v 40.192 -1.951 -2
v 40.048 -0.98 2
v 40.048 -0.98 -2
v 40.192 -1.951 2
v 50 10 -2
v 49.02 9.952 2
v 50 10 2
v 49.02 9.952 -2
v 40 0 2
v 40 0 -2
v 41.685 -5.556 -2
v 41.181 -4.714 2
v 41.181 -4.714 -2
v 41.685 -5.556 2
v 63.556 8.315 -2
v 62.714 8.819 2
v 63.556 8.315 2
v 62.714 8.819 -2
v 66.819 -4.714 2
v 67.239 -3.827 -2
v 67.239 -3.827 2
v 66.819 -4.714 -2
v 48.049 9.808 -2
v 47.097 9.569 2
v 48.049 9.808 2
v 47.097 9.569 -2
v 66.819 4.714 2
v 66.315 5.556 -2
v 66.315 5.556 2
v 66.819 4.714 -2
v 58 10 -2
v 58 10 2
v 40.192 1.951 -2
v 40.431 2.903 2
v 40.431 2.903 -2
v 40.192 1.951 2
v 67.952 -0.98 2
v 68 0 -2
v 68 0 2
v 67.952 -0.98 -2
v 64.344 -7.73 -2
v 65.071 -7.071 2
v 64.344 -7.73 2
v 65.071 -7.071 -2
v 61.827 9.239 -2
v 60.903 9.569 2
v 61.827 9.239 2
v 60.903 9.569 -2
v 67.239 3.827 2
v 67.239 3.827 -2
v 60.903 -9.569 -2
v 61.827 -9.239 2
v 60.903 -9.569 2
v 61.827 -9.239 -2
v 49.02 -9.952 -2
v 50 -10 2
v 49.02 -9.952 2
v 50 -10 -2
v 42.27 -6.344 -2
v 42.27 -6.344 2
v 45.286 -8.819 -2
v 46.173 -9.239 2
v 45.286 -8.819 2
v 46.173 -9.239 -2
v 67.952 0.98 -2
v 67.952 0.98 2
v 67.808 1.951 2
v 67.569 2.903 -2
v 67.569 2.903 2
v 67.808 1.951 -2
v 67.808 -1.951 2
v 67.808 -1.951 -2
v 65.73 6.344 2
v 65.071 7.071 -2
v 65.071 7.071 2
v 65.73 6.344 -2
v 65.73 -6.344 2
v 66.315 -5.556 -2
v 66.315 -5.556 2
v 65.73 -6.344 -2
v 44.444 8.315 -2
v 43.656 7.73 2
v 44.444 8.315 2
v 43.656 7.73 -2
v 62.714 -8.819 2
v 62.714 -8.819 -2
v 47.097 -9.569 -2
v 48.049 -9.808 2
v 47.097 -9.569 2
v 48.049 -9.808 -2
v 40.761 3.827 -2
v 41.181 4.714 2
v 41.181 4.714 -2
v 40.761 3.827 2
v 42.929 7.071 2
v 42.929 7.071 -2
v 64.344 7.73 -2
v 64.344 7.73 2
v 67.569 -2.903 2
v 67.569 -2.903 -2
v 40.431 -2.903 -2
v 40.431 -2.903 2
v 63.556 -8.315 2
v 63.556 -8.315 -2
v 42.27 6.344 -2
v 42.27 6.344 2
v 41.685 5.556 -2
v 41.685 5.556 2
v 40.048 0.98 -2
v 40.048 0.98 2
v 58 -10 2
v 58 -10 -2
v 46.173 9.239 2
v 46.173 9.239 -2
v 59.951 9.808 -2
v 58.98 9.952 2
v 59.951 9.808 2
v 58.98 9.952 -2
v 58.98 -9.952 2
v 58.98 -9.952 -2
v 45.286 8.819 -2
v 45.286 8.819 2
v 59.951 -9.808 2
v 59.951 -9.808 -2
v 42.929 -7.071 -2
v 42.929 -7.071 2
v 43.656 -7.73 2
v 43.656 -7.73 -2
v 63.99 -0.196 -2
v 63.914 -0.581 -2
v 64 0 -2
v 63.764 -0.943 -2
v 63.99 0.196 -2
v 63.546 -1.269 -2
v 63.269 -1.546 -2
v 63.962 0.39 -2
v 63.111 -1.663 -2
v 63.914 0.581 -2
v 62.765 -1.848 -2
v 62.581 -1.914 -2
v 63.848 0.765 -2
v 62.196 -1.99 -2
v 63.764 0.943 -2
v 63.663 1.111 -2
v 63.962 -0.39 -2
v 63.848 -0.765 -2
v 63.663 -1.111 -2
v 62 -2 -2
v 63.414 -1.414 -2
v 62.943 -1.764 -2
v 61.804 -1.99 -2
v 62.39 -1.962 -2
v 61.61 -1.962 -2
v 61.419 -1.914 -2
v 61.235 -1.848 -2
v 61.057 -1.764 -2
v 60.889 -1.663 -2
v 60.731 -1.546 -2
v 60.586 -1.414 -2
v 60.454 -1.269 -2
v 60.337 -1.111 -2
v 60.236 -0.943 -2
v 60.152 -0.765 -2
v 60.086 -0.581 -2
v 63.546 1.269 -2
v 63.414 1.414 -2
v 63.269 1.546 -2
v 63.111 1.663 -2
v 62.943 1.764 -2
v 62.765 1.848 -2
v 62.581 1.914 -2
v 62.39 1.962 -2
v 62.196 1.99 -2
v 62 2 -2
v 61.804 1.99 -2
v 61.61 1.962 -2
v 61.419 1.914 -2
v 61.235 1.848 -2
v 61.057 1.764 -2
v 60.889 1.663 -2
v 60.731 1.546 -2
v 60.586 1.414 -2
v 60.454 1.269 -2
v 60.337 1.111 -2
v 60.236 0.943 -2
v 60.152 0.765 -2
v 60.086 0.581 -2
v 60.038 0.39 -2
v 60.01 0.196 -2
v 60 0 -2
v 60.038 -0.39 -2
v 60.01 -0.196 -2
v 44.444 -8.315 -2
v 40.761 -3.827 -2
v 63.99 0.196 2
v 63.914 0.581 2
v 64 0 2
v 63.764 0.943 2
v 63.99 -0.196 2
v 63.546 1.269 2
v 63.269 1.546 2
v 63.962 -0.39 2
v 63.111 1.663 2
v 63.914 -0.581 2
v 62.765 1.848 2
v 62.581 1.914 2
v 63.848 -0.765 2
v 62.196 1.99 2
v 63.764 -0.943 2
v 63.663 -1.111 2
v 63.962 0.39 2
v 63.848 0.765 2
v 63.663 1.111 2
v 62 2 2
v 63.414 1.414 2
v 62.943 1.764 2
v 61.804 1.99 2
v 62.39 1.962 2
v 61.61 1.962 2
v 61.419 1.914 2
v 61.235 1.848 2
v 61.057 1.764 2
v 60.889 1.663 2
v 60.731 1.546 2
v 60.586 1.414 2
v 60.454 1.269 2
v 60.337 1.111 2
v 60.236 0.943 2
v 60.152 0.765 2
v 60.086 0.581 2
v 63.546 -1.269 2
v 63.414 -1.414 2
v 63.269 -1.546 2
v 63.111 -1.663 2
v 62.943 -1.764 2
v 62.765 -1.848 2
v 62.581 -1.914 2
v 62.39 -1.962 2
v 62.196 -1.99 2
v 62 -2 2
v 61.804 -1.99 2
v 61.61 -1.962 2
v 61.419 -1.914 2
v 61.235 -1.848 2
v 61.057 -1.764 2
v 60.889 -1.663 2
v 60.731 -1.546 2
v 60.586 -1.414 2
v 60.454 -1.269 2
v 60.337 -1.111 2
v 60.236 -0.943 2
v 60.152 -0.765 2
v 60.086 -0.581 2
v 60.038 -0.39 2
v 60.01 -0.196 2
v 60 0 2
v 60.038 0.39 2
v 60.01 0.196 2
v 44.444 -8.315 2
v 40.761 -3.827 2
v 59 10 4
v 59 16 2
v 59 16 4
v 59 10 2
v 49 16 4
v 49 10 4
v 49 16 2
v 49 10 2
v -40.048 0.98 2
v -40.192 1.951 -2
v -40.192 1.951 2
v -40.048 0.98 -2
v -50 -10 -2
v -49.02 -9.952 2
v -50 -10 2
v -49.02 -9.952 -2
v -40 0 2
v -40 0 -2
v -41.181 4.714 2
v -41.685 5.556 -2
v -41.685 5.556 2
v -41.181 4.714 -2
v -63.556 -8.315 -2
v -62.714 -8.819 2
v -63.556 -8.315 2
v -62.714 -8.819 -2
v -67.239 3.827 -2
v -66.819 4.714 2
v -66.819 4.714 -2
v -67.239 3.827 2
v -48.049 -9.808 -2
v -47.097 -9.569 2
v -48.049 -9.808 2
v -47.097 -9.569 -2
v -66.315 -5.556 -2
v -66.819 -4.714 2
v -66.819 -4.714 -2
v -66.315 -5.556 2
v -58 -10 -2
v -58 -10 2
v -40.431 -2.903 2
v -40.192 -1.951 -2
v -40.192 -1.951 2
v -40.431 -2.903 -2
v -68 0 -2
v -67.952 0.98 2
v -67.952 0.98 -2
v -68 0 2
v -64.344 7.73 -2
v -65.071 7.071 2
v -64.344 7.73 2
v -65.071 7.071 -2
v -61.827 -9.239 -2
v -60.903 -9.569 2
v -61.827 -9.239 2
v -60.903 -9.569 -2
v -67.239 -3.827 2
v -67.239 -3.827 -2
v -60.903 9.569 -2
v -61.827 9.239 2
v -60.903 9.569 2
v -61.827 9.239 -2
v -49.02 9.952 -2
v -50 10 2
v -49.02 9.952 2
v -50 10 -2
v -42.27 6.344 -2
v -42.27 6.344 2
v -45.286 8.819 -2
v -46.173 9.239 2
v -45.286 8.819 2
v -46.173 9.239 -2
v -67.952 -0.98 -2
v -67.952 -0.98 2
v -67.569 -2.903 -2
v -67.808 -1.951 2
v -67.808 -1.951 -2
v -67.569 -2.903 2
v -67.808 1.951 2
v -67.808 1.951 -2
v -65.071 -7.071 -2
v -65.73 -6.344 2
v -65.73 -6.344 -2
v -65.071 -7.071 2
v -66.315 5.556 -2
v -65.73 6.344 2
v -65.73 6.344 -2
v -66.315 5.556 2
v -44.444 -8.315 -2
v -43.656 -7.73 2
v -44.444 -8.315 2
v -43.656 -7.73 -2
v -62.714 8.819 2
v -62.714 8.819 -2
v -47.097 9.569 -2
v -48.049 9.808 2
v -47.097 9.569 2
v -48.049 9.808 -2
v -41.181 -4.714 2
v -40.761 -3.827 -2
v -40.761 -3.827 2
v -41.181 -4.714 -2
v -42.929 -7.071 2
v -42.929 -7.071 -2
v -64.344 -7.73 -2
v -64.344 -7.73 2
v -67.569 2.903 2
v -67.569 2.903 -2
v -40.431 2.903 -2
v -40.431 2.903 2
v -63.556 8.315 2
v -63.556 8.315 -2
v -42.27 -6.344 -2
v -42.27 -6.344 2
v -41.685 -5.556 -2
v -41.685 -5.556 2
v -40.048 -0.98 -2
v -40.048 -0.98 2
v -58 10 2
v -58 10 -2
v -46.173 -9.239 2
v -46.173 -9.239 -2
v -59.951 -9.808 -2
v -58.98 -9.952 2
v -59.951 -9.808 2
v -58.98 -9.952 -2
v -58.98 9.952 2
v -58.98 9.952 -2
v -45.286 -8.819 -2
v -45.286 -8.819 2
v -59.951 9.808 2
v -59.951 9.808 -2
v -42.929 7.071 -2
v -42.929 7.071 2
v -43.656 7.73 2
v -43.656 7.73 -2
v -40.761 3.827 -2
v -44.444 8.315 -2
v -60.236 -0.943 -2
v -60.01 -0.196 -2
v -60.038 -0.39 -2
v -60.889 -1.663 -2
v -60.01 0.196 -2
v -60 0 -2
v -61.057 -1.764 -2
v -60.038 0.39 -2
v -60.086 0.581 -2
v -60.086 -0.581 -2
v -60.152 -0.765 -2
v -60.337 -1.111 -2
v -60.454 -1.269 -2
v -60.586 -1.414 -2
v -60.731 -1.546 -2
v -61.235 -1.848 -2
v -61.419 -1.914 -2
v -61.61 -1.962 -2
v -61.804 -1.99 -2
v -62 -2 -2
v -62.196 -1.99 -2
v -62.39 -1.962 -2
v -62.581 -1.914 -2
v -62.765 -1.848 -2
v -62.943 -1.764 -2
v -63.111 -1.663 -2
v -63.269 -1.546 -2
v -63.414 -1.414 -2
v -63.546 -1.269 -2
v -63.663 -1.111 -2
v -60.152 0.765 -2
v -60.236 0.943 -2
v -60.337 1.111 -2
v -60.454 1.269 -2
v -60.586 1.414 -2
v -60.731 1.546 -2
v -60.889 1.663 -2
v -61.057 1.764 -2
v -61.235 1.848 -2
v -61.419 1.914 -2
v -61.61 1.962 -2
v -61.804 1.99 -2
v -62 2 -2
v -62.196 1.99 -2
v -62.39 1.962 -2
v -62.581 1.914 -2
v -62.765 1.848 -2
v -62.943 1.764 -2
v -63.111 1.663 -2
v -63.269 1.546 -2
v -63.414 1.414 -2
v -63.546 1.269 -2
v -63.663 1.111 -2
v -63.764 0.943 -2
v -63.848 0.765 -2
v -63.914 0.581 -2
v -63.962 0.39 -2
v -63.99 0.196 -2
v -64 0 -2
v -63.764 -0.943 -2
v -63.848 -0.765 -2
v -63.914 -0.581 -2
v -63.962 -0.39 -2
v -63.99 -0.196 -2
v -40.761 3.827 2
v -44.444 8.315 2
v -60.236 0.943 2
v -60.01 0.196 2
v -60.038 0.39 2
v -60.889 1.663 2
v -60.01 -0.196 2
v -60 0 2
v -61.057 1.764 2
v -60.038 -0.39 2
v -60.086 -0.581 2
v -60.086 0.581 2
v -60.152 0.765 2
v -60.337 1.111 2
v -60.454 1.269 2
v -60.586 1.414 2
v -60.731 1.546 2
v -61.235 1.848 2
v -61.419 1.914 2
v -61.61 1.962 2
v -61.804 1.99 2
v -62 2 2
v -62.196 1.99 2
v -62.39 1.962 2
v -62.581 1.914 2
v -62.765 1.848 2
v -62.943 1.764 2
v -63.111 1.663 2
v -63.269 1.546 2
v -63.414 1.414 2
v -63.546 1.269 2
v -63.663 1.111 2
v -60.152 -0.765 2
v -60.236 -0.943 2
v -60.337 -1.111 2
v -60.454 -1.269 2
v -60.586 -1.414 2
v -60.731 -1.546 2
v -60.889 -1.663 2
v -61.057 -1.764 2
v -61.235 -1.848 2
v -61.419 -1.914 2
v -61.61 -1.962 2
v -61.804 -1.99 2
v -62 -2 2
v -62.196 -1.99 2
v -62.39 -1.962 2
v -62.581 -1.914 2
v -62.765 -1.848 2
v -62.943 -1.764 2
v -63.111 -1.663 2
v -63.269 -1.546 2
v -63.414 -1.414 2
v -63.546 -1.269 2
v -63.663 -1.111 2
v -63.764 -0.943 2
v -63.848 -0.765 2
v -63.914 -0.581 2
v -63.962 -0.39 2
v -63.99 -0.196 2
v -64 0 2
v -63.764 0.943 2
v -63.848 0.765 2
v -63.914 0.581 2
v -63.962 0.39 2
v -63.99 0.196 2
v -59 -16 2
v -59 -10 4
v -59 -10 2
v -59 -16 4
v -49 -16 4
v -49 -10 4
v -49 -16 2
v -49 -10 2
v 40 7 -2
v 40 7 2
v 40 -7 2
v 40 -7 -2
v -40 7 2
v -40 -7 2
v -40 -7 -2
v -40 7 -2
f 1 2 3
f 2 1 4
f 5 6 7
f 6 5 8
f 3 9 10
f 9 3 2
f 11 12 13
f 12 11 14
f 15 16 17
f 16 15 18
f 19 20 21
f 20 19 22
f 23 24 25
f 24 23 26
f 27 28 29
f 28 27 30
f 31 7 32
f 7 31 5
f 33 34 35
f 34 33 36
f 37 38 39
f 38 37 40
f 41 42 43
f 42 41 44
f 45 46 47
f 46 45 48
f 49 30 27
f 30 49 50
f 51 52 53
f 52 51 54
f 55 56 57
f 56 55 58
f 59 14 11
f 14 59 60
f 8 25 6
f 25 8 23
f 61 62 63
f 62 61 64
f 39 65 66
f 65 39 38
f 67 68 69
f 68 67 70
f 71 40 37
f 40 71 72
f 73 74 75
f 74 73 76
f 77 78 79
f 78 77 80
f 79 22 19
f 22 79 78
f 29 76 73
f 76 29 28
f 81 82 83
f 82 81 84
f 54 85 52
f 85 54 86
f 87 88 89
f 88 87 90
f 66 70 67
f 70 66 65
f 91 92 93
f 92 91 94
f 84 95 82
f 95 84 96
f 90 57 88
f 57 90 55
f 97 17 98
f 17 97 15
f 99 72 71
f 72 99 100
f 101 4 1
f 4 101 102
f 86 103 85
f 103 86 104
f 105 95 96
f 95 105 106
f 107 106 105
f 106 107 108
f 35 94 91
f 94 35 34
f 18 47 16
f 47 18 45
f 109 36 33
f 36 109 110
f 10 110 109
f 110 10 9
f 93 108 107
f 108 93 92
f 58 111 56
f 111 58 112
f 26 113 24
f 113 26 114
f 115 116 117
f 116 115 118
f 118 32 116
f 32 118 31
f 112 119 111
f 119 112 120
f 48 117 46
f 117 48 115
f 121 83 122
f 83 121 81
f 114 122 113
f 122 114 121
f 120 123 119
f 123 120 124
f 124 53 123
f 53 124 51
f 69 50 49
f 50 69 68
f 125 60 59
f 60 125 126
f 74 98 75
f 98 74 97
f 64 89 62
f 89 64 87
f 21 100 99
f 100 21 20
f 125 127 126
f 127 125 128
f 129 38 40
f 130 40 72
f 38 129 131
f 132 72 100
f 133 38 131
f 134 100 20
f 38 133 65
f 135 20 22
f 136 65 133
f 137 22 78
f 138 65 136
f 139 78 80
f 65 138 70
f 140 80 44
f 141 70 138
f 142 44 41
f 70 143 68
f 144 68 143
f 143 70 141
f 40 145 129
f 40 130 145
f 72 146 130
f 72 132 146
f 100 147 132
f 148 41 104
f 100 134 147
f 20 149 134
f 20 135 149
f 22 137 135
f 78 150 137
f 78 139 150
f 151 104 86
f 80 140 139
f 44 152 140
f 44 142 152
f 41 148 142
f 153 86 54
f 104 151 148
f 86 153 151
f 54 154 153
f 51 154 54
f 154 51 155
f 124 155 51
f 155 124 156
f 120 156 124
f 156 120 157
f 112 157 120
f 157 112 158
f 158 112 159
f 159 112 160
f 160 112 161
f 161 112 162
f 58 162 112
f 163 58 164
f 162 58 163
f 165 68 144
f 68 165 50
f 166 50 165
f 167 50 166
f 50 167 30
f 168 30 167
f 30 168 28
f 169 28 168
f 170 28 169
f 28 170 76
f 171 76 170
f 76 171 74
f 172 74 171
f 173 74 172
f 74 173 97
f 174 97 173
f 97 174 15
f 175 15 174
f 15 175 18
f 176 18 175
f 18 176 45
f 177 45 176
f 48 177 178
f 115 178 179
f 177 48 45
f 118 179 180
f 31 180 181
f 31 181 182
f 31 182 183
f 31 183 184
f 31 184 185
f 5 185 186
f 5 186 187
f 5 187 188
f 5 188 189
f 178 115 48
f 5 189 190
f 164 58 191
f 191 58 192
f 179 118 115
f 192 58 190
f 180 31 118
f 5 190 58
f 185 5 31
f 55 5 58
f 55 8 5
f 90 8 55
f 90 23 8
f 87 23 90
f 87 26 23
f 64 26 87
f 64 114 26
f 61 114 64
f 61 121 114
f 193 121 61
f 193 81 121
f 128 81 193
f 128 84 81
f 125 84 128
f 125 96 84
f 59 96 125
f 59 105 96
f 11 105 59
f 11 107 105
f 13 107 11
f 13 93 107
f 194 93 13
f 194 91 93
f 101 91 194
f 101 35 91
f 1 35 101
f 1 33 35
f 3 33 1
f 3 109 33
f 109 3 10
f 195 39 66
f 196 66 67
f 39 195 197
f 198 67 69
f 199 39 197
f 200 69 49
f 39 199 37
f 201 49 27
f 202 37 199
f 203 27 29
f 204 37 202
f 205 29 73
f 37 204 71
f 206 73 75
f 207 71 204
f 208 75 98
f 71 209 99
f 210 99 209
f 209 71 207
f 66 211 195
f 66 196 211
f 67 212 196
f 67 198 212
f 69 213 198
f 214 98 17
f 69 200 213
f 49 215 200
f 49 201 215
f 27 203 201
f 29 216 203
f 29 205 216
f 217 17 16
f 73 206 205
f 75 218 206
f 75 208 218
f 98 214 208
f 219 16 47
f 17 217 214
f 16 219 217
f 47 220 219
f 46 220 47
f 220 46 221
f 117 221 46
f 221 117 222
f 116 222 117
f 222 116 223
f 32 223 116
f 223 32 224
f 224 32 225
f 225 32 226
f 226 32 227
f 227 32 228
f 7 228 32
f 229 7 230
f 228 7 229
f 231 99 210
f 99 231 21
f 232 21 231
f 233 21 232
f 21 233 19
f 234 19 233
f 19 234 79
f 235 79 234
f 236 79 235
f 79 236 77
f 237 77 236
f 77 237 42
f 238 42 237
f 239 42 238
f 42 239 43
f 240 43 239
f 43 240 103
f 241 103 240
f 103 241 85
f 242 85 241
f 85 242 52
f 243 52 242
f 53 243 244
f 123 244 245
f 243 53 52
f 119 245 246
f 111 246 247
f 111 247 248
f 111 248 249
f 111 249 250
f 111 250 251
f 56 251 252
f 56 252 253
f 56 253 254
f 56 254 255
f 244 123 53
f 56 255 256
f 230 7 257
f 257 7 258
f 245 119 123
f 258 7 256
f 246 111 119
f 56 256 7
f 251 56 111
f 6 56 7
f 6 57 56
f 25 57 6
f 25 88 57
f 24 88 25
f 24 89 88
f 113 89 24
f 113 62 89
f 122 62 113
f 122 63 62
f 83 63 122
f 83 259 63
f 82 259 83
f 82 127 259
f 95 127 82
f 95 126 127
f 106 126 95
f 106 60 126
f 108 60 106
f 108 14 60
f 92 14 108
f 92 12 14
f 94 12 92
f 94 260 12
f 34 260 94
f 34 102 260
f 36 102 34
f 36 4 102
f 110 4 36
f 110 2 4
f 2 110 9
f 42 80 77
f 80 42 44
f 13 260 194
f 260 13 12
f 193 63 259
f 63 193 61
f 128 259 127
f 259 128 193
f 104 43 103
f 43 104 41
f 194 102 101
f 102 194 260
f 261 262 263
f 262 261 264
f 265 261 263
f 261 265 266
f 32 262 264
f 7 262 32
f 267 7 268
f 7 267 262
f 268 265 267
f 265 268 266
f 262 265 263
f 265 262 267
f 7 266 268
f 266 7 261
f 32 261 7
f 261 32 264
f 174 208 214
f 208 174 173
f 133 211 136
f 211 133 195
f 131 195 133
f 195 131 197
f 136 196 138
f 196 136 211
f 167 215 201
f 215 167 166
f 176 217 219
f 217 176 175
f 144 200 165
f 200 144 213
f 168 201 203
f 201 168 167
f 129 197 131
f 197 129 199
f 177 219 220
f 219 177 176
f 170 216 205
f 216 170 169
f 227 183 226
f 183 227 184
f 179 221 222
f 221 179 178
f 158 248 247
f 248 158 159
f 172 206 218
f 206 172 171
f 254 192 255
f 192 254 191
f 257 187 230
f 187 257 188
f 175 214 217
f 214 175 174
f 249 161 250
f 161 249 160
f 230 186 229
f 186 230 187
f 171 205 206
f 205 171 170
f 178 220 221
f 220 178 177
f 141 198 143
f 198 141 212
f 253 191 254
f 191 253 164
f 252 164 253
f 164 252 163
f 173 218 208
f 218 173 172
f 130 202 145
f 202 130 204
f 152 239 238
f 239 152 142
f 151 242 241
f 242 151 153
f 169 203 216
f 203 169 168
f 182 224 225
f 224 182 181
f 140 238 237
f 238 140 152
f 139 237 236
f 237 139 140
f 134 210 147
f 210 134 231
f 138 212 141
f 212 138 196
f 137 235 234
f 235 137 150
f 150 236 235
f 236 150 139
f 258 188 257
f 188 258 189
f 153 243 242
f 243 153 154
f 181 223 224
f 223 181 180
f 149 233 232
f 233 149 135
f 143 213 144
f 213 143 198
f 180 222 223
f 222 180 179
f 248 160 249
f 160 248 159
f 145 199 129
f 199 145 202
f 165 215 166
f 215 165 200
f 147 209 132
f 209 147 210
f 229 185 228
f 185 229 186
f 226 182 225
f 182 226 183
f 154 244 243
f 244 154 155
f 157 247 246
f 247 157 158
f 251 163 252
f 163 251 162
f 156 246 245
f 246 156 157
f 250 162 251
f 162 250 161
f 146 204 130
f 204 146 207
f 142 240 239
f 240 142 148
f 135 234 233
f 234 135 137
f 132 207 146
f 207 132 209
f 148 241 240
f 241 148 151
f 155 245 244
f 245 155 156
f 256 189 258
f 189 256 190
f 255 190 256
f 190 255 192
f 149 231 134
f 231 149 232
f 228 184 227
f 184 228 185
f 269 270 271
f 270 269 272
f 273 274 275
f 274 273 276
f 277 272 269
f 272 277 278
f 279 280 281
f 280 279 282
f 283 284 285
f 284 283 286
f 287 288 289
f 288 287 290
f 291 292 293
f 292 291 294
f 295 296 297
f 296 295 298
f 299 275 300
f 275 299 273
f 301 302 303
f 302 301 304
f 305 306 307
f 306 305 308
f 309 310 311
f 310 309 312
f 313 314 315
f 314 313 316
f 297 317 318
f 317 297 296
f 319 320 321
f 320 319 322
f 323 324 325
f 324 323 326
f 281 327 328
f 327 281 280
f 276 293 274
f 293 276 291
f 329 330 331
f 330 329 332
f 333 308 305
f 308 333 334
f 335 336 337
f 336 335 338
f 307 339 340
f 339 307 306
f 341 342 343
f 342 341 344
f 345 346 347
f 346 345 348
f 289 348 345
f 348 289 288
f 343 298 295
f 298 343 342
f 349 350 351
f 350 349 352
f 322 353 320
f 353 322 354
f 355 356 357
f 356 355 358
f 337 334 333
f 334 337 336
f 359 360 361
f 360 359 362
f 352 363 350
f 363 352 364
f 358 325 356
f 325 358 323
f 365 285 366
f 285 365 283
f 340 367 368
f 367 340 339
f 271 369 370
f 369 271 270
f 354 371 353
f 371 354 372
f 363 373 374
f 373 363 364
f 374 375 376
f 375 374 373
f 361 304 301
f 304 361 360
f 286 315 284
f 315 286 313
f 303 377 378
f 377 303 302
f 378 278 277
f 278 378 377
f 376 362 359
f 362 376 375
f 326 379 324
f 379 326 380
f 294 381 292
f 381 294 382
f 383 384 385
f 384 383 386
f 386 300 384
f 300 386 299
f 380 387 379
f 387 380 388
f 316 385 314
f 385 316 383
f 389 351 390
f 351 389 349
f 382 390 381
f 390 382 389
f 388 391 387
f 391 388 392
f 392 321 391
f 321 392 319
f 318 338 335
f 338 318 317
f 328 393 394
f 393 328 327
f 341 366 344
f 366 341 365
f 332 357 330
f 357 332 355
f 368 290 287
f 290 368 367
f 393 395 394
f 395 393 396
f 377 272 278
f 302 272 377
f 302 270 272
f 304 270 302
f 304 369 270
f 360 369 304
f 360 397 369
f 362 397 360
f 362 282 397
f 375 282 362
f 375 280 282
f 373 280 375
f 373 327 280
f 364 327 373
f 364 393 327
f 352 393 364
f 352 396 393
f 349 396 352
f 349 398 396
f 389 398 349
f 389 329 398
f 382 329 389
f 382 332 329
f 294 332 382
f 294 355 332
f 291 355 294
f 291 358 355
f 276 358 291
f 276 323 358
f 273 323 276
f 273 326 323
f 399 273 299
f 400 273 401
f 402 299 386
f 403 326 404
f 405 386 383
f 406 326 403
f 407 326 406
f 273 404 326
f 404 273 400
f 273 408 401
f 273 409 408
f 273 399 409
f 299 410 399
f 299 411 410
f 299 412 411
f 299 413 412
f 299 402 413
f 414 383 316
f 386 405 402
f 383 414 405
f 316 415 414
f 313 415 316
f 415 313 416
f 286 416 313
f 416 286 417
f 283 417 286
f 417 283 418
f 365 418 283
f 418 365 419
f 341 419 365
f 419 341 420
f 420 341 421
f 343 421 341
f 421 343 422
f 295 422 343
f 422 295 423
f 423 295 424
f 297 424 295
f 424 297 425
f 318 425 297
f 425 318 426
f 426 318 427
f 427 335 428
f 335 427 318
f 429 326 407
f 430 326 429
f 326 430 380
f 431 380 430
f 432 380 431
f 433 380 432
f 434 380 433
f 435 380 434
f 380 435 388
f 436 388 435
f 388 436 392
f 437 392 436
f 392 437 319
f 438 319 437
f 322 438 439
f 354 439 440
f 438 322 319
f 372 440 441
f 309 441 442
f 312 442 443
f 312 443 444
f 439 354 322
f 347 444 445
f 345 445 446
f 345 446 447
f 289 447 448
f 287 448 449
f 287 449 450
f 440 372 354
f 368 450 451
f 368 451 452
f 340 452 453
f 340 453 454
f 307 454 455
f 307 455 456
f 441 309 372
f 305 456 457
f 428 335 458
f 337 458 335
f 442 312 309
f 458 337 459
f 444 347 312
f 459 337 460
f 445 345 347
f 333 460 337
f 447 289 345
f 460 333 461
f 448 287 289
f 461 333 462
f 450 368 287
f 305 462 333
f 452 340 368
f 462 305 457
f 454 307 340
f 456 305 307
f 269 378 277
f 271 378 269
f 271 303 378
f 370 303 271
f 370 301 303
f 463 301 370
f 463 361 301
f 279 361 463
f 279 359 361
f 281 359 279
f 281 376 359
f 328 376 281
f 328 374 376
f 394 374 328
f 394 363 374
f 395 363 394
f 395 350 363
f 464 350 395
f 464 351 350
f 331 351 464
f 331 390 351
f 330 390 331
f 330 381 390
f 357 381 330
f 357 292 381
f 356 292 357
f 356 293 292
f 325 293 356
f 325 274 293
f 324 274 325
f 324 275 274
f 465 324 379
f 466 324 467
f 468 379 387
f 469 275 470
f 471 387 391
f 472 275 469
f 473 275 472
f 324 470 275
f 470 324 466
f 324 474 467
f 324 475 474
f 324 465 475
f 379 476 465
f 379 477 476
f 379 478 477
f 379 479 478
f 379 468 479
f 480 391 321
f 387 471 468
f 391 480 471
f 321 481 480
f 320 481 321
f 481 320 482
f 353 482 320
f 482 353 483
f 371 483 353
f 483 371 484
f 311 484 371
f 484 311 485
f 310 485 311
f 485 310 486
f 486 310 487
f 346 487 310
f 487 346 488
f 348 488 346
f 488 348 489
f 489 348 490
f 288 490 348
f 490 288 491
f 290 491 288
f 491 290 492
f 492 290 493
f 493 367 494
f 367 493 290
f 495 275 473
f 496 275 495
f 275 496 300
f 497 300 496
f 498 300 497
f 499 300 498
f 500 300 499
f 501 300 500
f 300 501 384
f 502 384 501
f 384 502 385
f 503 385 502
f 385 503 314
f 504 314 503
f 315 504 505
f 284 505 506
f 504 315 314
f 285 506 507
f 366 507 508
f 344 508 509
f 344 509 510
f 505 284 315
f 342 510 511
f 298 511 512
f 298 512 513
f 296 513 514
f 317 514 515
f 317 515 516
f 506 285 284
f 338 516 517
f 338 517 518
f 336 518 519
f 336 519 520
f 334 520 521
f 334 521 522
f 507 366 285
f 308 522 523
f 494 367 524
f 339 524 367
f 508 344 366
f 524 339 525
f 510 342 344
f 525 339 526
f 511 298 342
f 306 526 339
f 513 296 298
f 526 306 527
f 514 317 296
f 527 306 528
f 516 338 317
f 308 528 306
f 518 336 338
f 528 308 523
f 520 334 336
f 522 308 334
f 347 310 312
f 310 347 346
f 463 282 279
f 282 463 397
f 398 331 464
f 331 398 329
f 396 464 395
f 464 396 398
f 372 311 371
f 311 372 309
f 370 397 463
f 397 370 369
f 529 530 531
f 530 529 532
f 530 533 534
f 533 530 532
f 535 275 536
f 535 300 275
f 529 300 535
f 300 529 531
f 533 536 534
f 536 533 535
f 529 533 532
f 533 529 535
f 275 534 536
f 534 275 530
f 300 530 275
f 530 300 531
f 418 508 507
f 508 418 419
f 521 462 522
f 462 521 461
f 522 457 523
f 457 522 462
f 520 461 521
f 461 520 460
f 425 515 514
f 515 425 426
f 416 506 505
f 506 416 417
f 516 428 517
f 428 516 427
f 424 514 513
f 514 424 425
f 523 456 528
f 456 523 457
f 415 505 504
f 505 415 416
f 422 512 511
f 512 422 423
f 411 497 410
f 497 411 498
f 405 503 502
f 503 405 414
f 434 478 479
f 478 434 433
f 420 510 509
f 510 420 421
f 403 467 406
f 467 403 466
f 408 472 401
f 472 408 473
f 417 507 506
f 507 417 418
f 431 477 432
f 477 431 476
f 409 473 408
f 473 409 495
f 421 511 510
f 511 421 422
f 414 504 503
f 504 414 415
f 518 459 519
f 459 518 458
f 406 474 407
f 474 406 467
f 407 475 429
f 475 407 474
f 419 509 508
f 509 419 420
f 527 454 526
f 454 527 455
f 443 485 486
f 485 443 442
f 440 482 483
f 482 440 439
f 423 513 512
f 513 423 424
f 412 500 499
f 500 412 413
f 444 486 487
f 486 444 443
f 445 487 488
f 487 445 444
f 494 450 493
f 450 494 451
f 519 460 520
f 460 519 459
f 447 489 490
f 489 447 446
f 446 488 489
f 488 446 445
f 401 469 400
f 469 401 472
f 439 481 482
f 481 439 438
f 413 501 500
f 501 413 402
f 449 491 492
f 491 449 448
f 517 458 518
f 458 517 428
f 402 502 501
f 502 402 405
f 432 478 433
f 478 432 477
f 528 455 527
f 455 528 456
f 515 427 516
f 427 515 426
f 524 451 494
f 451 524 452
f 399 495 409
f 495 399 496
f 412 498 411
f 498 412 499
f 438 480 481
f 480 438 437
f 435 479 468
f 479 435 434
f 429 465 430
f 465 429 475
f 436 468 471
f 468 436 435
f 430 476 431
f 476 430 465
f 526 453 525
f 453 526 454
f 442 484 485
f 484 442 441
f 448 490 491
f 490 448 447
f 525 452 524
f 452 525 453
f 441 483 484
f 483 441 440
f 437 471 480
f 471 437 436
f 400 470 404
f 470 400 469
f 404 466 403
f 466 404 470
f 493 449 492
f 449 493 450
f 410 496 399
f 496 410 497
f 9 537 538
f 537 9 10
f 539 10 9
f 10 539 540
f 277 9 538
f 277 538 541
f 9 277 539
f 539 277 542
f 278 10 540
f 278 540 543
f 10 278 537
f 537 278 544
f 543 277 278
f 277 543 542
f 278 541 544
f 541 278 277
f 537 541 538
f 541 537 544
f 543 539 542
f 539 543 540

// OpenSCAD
$fn=64;

web_len = 80;
web_w   = 14;
web_t   = 4;

flange_len = 28;
flange_w   = 20;
flange_t   = 4;

hole_d = 4;
hole_edge_offset = 6;

lug_len = 10;
lug_w   = 6;
lug_h   = 2;
lug_side_offset = 0;

module obround2d(L, W){
    r = W/2;
    hull(){
        translate([-(L/2 - r), 0]) circle(r=r);
        translate([ (L/2 - r), 0]) circle(r=r);
    }
}

module flange(){
    difference(){
        union(){
            linear_extrude(height=flange_t, center=true)
                obround2d(flange_len, flange_w);

            translate([0, (flange_w/2 + lug_w/2 + lug_side_offset), (flange_t/2 + lug_h/2)])
                cube([lug_len, lug_w, lug_h], center=true);
        }

        translate([flange_len/2 - hole_edge_offset, 0, 0])
            cylinder(h=flange_t + lug_h + 2, d=hole_d, center=true);
    }
}

module bracket(){
    union(){
        cube([web_len, web_w, web_t], center=true);

        translate([ web_len/2 + flange_len/2, 0, 0]) flange();
        translate([-(web_len/2 + flange_len/2), 0, 0]) rotate([0,0,180]) flange();
    }
}

bracket();
